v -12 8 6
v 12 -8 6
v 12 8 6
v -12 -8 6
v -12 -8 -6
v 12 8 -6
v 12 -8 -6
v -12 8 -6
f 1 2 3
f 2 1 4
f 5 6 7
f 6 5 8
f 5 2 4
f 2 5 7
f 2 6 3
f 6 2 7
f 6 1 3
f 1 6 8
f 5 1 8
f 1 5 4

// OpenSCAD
// Auto-generated from tests/data/feature_fixtures_manifest.json
// fixture: box_hollow_ambiguous
// fixture_type: box
// description: Hollow box with interior cavity - can be interpreted as single hollow box OR as six separate wall plates
$fn = 96;

box_size = [24.000000, 16.000000, 12.000000];
box_origin = [-12.000000, -8.000000, -6.000000];

module through_hole_x(center, diameter, length) {
  translate([box_origin[0] - 0.1, center[1], center[2]])
    rotate(a=90, v=[0, 1, 0]) cylinder(d=diameter, h=length, center=false);
}

module through_hole_y(center, diameter, length) {
  translate([center[0], box_origin[1] - 0.1, center[2]])
    rotate(a=90, v=[-1, 0, 0]) cylinder(d=diameter, h=length, center=false);
}

module through_hole_z(center, diameter, length) {
  translate([center[0], center[1], box_origin[2] - 0.1])
    cylinder(d=diameter, h=length, center=false);
}

difference() {
  translate(box_origin) cube(box_size);
}
